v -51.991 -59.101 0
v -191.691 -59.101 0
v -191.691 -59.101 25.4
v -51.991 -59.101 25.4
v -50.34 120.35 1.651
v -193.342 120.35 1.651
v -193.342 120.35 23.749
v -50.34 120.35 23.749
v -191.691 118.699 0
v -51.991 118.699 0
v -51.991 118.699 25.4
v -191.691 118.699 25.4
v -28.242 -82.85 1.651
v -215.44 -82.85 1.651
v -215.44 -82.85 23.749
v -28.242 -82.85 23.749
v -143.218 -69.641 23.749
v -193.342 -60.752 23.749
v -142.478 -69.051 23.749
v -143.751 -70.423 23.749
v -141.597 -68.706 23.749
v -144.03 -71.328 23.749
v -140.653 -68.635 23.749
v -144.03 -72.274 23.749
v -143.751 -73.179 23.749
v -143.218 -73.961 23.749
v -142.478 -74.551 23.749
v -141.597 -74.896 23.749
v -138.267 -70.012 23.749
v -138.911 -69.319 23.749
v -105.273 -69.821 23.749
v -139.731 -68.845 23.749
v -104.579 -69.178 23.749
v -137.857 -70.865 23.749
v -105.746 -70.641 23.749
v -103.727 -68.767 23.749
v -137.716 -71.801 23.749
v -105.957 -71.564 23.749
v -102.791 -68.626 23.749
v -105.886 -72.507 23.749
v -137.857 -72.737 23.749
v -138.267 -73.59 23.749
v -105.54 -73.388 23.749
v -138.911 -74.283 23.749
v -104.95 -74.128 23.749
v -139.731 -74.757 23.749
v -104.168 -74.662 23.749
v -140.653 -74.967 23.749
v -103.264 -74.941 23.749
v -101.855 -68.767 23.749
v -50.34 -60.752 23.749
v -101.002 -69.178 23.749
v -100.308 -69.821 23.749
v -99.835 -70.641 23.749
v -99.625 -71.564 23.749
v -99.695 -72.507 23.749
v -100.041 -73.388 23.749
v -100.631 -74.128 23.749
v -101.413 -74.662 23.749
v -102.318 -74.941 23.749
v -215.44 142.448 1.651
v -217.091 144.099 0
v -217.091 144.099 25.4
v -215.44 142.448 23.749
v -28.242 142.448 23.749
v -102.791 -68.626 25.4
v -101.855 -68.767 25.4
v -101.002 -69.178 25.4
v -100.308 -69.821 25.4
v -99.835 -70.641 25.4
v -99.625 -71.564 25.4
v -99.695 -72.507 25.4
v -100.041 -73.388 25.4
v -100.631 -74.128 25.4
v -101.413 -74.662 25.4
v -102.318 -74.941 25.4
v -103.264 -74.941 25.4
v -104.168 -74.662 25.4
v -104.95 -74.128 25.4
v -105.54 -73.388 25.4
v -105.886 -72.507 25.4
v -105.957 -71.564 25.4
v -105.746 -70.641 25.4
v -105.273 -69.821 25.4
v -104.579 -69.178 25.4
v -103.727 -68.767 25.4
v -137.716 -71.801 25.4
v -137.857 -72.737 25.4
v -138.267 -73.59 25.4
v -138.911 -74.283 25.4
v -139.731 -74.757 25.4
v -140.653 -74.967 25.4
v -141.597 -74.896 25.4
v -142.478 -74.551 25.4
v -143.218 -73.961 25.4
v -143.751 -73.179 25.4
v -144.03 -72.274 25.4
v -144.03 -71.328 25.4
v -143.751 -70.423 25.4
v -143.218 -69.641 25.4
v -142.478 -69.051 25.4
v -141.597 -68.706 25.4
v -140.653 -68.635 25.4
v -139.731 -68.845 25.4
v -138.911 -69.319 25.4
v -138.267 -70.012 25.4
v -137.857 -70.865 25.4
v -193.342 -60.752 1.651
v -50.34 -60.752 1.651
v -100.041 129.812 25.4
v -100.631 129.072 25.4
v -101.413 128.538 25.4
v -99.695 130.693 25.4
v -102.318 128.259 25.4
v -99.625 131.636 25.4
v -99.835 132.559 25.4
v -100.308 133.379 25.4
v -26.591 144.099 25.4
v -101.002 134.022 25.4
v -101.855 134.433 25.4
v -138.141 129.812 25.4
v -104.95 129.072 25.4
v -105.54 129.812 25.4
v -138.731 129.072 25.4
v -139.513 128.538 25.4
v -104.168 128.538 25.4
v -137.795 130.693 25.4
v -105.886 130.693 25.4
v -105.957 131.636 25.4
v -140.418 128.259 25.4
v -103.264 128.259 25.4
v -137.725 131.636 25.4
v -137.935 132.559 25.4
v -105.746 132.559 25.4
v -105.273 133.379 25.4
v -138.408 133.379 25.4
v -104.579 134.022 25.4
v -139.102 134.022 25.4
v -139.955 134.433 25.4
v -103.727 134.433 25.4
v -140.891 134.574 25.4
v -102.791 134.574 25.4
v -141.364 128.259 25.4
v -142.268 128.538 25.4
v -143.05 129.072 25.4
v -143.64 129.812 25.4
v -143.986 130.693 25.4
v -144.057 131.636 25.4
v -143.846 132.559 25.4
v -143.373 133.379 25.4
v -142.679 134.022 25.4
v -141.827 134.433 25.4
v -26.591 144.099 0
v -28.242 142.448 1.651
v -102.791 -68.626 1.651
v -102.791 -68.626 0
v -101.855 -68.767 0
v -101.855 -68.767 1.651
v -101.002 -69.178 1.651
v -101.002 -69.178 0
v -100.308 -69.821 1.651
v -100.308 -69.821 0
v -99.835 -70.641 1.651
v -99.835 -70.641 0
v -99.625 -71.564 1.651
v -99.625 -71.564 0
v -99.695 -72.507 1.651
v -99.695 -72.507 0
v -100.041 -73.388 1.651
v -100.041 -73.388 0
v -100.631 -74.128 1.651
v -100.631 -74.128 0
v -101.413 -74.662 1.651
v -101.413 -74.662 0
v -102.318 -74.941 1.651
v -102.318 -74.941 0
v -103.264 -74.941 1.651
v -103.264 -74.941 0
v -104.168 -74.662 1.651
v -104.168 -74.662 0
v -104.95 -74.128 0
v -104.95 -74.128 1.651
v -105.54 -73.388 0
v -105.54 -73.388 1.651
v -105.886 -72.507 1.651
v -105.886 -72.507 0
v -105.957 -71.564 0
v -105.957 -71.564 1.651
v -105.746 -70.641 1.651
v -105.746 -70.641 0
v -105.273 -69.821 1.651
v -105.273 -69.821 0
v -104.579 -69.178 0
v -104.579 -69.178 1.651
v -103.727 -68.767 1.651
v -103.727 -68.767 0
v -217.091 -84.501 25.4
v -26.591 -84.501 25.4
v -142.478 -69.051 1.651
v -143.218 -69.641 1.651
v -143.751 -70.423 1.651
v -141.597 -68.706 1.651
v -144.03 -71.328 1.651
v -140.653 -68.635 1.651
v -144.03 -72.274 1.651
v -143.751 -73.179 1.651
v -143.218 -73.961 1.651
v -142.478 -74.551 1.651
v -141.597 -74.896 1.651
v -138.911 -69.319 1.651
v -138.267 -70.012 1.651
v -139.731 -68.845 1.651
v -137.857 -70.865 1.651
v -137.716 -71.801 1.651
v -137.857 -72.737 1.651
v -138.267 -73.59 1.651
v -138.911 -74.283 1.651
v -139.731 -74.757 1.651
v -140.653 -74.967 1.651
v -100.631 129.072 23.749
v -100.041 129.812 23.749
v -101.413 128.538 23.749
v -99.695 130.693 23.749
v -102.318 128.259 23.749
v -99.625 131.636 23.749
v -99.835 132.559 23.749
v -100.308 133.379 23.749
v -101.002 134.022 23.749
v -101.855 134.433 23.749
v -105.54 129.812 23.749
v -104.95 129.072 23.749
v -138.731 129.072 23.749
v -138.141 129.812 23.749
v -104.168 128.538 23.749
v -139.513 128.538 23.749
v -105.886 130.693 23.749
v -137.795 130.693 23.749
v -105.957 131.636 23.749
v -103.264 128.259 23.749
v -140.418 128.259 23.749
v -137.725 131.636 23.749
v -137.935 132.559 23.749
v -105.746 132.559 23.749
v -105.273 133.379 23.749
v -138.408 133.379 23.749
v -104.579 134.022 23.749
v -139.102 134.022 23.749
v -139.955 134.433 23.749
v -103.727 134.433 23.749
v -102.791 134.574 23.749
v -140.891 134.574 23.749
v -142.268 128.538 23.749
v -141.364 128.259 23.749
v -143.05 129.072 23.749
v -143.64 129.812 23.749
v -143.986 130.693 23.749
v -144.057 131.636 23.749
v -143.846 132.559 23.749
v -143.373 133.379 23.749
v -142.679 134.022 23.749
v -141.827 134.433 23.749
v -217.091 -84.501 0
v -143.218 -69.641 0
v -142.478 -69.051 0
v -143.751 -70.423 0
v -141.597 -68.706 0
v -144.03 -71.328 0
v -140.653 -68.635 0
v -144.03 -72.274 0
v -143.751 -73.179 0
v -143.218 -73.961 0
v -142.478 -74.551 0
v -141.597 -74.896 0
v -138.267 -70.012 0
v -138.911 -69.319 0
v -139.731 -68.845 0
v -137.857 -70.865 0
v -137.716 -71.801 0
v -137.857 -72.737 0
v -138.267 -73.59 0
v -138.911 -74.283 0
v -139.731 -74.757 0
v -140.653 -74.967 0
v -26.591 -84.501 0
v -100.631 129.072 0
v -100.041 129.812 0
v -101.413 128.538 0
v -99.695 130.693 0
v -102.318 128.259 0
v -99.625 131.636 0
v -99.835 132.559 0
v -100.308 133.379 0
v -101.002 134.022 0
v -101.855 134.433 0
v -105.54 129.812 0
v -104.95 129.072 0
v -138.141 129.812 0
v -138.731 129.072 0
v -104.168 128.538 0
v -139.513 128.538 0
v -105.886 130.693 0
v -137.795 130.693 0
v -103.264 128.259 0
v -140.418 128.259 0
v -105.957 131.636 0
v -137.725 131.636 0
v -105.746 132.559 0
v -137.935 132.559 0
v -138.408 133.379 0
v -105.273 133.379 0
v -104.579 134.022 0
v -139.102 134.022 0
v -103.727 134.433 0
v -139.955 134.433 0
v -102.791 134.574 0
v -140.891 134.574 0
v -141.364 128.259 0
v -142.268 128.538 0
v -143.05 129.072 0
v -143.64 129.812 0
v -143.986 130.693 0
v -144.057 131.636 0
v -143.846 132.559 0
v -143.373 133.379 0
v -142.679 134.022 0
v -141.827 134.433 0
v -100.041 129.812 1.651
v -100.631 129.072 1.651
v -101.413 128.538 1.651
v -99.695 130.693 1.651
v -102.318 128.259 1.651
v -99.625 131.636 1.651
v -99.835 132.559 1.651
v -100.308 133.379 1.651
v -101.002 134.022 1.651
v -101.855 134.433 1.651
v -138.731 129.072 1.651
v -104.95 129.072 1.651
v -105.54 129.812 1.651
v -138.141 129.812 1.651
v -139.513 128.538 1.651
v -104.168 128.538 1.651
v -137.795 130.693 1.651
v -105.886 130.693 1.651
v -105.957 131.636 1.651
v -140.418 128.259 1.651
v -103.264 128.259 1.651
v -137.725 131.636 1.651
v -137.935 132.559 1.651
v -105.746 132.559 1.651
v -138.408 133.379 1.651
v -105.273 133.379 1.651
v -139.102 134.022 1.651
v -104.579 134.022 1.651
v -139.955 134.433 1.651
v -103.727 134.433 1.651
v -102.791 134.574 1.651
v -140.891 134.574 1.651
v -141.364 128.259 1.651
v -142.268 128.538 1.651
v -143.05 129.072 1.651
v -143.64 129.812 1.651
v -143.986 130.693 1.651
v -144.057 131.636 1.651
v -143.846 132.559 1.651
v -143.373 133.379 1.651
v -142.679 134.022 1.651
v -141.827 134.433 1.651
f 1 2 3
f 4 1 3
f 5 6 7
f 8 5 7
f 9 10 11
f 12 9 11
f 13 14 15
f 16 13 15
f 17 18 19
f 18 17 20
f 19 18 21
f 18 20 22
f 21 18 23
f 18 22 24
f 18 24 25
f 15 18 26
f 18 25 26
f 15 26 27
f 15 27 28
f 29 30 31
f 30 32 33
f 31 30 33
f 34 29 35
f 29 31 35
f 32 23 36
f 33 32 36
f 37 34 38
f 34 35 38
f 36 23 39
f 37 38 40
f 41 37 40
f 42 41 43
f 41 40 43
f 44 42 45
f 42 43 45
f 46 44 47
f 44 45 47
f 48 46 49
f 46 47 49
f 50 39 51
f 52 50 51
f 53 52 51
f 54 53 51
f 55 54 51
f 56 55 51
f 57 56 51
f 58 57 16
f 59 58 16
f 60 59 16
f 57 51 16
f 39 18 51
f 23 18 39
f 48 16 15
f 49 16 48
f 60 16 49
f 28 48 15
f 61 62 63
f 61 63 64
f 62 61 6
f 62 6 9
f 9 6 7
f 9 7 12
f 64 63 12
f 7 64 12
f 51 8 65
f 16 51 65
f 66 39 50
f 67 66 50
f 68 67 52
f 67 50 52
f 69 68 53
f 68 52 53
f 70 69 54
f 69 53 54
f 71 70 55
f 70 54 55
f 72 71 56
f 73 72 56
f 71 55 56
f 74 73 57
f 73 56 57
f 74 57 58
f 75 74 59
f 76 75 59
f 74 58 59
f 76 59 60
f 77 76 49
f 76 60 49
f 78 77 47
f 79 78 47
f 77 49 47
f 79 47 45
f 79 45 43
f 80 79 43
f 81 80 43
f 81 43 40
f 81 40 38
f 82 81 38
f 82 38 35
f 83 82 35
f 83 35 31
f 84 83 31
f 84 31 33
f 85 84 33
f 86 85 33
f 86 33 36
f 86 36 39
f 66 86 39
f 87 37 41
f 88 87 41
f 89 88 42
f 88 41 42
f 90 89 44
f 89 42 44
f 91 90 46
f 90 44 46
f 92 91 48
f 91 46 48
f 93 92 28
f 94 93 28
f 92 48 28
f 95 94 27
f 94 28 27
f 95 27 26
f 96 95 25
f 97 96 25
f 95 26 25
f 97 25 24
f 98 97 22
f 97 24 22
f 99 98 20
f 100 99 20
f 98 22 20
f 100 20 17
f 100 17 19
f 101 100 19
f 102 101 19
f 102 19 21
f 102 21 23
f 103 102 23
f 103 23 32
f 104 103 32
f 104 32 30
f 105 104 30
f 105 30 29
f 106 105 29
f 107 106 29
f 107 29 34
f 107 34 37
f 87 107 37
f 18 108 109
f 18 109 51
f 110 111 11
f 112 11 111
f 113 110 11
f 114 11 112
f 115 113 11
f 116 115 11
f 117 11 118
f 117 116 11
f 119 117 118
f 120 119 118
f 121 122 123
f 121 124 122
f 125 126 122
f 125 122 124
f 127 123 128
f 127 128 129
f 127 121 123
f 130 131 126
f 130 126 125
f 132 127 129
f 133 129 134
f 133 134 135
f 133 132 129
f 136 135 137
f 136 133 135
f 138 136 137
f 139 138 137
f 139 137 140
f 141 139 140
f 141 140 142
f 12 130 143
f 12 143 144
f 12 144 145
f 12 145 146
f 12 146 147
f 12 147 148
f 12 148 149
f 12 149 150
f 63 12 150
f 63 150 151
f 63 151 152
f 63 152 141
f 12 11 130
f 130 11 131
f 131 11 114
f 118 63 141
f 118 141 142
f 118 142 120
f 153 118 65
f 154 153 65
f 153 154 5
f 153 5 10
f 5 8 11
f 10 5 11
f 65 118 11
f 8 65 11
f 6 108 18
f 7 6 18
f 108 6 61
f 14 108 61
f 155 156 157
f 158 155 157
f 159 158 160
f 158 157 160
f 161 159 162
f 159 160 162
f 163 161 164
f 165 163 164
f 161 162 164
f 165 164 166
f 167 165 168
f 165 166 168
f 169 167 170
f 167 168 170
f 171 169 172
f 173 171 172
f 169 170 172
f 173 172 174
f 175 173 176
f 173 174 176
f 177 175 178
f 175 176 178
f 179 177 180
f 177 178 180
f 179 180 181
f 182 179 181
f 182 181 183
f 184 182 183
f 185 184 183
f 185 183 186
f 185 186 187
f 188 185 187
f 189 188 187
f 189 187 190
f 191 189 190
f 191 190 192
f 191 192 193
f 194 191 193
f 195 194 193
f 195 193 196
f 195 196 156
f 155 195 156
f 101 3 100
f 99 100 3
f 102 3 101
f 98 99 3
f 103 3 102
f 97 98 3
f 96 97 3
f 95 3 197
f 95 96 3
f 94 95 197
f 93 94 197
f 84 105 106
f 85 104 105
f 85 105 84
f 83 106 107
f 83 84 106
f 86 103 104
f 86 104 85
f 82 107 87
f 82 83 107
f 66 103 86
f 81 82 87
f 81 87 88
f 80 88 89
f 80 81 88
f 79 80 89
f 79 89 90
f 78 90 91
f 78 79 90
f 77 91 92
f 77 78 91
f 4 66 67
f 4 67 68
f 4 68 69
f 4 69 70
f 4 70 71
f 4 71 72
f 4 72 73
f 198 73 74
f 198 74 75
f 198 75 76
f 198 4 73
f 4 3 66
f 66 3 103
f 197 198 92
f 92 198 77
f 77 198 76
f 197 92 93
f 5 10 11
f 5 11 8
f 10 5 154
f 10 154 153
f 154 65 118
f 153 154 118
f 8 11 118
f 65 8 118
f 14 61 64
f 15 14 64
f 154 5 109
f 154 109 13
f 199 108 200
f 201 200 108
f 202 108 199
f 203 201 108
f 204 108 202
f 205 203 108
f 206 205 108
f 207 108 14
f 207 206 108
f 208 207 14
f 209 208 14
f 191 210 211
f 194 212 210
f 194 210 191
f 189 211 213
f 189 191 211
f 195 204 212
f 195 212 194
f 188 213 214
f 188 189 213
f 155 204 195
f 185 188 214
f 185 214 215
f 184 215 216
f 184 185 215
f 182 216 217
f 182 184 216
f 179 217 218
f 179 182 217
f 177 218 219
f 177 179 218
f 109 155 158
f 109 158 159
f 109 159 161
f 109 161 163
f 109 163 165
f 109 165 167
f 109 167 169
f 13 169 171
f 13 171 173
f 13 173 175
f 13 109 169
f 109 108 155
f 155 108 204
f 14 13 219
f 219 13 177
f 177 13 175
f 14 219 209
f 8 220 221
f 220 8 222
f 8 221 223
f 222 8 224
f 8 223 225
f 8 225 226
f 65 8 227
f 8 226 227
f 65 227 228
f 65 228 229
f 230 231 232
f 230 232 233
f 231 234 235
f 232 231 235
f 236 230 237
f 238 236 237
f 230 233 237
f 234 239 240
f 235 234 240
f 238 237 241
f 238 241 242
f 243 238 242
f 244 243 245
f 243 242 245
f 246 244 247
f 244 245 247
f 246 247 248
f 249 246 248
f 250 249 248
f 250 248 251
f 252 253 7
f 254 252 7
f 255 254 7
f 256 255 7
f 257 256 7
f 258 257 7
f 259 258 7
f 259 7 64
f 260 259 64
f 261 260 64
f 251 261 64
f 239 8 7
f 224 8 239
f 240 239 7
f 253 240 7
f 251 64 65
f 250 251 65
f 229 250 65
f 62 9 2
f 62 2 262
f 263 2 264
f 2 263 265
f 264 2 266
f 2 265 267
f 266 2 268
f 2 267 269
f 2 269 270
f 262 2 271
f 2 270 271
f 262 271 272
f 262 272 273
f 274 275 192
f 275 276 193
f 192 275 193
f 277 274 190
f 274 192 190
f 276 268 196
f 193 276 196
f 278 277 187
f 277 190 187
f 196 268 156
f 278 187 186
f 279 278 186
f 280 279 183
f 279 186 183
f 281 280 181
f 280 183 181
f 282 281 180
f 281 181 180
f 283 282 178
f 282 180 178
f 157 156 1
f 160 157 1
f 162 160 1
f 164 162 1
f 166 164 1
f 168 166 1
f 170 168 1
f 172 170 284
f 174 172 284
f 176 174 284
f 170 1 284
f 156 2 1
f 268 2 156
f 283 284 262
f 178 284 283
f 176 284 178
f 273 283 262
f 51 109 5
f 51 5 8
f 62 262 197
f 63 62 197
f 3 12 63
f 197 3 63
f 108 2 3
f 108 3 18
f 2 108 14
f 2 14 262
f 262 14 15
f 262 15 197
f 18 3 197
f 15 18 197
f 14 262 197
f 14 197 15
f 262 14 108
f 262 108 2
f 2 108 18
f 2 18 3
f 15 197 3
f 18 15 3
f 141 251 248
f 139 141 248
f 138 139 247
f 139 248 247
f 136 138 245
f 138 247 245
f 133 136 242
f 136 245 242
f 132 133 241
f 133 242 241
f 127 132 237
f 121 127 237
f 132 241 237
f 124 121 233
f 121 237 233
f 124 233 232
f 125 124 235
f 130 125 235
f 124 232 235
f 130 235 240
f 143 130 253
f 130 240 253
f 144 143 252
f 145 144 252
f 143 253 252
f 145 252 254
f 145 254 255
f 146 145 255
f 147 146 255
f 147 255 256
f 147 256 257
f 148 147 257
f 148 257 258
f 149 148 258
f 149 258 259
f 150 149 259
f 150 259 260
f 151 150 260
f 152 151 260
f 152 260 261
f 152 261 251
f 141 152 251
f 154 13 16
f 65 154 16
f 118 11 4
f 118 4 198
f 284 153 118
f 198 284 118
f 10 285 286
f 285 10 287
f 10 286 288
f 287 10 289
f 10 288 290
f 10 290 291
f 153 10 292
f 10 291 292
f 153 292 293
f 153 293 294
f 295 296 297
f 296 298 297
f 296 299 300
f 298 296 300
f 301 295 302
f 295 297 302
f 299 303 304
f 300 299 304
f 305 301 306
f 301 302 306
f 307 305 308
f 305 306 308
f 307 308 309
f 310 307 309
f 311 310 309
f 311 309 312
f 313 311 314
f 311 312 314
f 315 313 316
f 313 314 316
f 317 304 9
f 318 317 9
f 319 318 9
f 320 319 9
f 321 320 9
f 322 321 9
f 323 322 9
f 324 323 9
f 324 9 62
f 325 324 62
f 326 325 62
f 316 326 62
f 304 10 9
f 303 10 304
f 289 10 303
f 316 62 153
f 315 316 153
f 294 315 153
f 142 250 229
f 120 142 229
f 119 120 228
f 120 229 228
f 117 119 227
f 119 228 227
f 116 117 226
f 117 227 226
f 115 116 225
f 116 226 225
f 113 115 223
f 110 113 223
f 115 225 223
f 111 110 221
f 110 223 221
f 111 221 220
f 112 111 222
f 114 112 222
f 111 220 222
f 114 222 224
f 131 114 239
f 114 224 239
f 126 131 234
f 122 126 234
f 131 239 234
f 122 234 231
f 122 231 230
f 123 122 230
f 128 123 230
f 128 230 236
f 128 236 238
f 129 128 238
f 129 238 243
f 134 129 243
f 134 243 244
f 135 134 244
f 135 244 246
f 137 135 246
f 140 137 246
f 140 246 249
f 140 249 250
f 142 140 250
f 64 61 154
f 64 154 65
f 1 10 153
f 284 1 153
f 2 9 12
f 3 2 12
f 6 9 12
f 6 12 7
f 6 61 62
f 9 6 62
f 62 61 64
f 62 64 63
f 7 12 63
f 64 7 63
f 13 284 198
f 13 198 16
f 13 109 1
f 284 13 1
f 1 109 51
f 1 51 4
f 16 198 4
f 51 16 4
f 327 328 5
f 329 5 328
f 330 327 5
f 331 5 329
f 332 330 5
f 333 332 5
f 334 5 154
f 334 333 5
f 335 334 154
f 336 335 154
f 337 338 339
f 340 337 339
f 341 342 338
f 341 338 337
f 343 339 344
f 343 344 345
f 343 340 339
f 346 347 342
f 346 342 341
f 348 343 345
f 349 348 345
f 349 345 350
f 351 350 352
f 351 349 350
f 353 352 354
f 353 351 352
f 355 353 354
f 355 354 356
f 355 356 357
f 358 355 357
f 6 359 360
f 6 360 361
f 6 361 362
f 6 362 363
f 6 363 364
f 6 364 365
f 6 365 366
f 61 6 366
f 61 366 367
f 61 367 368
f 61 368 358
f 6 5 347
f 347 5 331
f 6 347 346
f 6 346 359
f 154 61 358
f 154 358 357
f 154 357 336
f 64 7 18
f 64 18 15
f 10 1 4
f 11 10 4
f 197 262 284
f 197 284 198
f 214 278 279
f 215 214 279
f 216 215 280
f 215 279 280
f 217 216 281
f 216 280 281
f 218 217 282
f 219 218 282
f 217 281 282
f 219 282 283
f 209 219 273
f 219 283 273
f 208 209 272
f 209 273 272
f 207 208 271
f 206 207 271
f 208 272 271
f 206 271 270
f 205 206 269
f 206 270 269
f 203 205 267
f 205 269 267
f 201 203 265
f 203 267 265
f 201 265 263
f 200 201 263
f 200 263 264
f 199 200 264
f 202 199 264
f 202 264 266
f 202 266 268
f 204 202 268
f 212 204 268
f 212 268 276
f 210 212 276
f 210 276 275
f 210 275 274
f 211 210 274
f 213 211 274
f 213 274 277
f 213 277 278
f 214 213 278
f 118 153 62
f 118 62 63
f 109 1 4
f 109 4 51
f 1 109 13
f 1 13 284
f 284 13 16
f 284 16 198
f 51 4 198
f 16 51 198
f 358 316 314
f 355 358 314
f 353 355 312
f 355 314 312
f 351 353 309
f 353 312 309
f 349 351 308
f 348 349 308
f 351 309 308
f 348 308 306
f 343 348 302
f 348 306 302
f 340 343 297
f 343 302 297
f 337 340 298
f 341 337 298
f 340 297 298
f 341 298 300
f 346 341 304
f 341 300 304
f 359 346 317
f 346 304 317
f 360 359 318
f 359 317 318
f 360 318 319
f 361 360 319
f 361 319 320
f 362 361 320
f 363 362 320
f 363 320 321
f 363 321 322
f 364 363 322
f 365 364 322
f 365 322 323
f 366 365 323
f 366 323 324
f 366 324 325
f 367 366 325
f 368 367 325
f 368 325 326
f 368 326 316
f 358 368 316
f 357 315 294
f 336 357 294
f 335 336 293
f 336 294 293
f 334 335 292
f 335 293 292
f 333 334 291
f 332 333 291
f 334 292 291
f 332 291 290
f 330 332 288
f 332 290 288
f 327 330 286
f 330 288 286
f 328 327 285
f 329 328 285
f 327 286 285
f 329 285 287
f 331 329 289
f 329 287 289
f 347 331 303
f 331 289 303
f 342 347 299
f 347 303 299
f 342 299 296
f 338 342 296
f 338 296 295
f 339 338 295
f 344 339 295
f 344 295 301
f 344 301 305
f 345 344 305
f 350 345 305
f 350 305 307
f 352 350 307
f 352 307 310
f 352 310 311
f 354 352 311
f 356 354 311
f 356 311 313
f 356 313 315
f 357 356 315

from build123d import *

# Parameters (mm, degrees)
STRUCTURAL_MEMBER1_DEPTH      = 227.421024484
STRUCTURAL_MEMBER1_DEPTH_BACK = 36.921024484
SKETCH11_W                    = 25.4
SKETCH11_H                    = 25.4
SKETCH11_W_2                  = 22.098
SKETCH11_H_2                  = 22.098
SKETCH11_ON_SEGMENT_2_W       = 25.4
SKETCH11_ON_SEGMENT_2_H       = 25.4
SKETCH11_ON_SEGMENT_2_W_2     = 22.098
SKETCH11_ON_SEGMENT_2_H_2     = 22.098
STRUCTURAL_MEMBER1_2_DEPTH    = 302.442048969
SKETCH11_ON_SEGMENT_3_W       = 25.4
SKETCH11_ON_SEGMENT_3_H       = 25.4
SKETCH11_ON_SEGMENT_3_W_2     = 22.098
SKETCH11_ON_SEGMENT_3_H_2     = 22.098
STRUCTURAL_MEMBER1_3_DEPTH    = 264.342048969
SKETCH11_ON_SEGMENT_4_W       = 25.4
SKETCH11_ON_SEGMENT_4_H       = 25.4
SKETCH11_ON_SEGMENT_4_W_2     = 22.098
SKETCH11_ON_SEGMENT_4_H_2     = 22.098
STRUCTURAL_MEMBER1_4_DEPTH    = 302.442048969
SKETCH13_R                    = 3.175
CUT_EXTRUDE1_DEPTH            = 262.797779946
SKETCH14_R                    = 3.175
CUT_EXTRUDE2_DEPTH            = 262.797779946


with BuildPart() as part:
    # Sketch11 → Structural Member1 (new, two sides: drawn at the far end of the back side and taken through both)
    with BuildSketch(Plane(origin=(-217.090748408, 131.399009505, 12.7), x_dir=(0, 1, 0), z_dir=(1, 0, 0)).offset(-STRUCTURAL_MEMBER1_DEPTH_BACK)):
        Rectangle(SKETCH11_W, SKETCH11_H)
        Rectangle(SKETCH11_W_2, SKETCH11_H_2, mode=Mode.SUBTRACT)
    extrude(amount=STRUCTURAL_MEMBER1_DEPTH + STRUCTURAL_MEMBER1_DEPTH_BACK)

    # Structural Member1 mitre 1
    split(bisect_by=Plane(origin=(-217.090748408, 144.099009505, 0), x_dir=(-0.707106781, 0.707106781, 0), z_dir=(0.707106781, 0.707106781, 0)), keep=Keep.TOP)

    # Structural Member1 mitre 2
    split(bisect_by=Plane(origin=(-26.590748408, 144.099009505, 0), x_dir=(-0.707106781, -0.707106781, 0), z_dir=(-0.707106781, 0.707106781, 0)), keep=Keep.TOP)

    # Sketch13 → Cut-Extrude1 (cut, through all)
    with BuildSketch(Plane(origin=(0, 0, 0), x_dir=(-1, 0, 0), z_dir=(0, 0, -1))):
        with Locations(Location((102.790748408, 131.399009505, 0), (0, 0, 90))):
            Circle(SKETCH13_R)
        with Locations(Location((140.890748408, 131.399009505, 0), (0, 0, 90))):
            Circle(SKETCH13_R)
    extrude(amount=-CUT_EXTRUDE1_DEPTH, mode=Mode.SUBTRACT)


with BuildPart() as body_2:
    # Sketch11 on segment 2 (carried to segment 2) → Structural Member1 2 (new body)
    with BuildSketch(Plane(origin=(-39.290748408, 181.020033989, 12.7), x_dir=(1, 0, 0), z_dir=(0, -1, 0))):
        Rectangle(SKETCH11_ON_SEGMENT_2_W, SKETCH11_ON_SEGMENT_2_H)
        Rectangle(SKETCH11_ON_SEGMENT_2_W_2, SKETCH11_ON_SEGMENT_2_H_2, mode=Mode.SUBTRACT)
    extrude(amount=STRUCTURAL_MEMBER1_2_DEPTH)

    # Structural Member1 2 mitre 1
    split(bisect_by=Plane(origin=(-26.590748408, 144.099009505, 0), x_dir=(0.707106781, 0.707106781, 0), z_dir=(0.707106781, -0.707106781, 0)), keep=Keep.TOP)

    # Structural Member1 2 mitre 2
    split(bisect_by=Plane(origin=(-26.590748408, -84.500990495, 0), x_dir=(-0.707106781, 0.707106781, 0), z_dir=(0.707106781, 0.707106781, 0)), keep=Keep.TOP)


with BuildPart() as body_3:
    # Sketch11 on segment 3 (carried to segment 3) → Structural Member1 3 (new body)
    with BuildSketch(Plane(origin=(10.330276076, -71.800990495, 12.7), x_dir=(0, -1, 0), z_dir=(-1, 0, 0))):
        Rectangle(SKETCH11_ON_SEGMENT_3_W, SKETCH11_ON_SEGMENT_3_H)
        Rectangle(SKETCH11_ON_SEGMENT_3_W_2, SKETCH11_ON_SEGMENT_3_H_2, mode=Mode.SUBTRACT)
    extrude(amount=STRUCTURAL_MEMBER1_3_DEPTH)

    # Structural Member1 3 mitre 1
    split(bisect_by=Plane(origin=(-217.090748408, -84.500990495, 0), x_dir=(0.707106781, 0.707106781, 0), z_dir=(0.707106781, -0.707106781, 0)), keep=Keep.TOP)

    # Structural Member1 3 mitre 2
    split(bisect_by=Plane(origin=(-26.590748408, -84.500990495, 0), x_dir=(0.707106781, -0.707106781, 0), z_dir=(-0.707106781, -0.707106781, 0)), keep=Keep.TOP)

    # Sketch14 → Cut-Extrude2 (cut, through all)
    with BuildSketch(Plane(origin=(0, 0, 0), x_dir=(-1, 0, 0), z_dir=(0, 0, -1))):
        with Locations(Location((140.890748408, -71.800990495, 0), (0, 0, 180))):
            Circle(SKETCH14_R)
        with Locations(Location((102.790748408, -71.800990495, 0), (0, 0, 90))):
            Circle(SKETCH14_R)
    extrude(amount=-CUT_EXTRUDE2_DEPTH, mode=Mode.SUBTRACT)


with BuildPart() as body_4:
    # Sketch11 on segment 4 (carried to segment 4) → Structural Member1 4 (new body)
    with BuildSketch(Plane(origin=(-204.390748408, -121.422014979, 12.7), x_dir=(-1, 0, 0), z_dir=(0, 1, 0))):
        Rectangle(SKETCH11_ON_SEGMENT_4_W, SKETCH11_ON_SEGMENT_4_H)
        Rectangle(SKETCH11_ON_SEGMENT_4_W_2, SKETCH11_ON_SEGMENT_4_H_2, mode=Mode.SUBTRACT)
    extrude(amount=STRUCTURAL_MEMBER1_4_DEPTH)

    # Structural Member1 4 mitre 1
    split(bisect_by=Plane(origin=(-217.090748408, 144.099009505, 0), x_dir=(0.707106781, -0.707106781, 0), z_dir=(-0.707106781, -0.707106781, 0)), keep=Keep.TOP)

    # Structural Member1 4 mitre 2
    split(bisect_by=Plane(origin=(-217.090748408, -84.500990495, 0), x_dir=(-0.707106781, -0.707106781, 0), z_dir=(-0.707106781, 0.707106781, 0)), keep=Keep.TOP)


solid = Compound([part.part, body_2.part, body_3.part, body_4.part])
